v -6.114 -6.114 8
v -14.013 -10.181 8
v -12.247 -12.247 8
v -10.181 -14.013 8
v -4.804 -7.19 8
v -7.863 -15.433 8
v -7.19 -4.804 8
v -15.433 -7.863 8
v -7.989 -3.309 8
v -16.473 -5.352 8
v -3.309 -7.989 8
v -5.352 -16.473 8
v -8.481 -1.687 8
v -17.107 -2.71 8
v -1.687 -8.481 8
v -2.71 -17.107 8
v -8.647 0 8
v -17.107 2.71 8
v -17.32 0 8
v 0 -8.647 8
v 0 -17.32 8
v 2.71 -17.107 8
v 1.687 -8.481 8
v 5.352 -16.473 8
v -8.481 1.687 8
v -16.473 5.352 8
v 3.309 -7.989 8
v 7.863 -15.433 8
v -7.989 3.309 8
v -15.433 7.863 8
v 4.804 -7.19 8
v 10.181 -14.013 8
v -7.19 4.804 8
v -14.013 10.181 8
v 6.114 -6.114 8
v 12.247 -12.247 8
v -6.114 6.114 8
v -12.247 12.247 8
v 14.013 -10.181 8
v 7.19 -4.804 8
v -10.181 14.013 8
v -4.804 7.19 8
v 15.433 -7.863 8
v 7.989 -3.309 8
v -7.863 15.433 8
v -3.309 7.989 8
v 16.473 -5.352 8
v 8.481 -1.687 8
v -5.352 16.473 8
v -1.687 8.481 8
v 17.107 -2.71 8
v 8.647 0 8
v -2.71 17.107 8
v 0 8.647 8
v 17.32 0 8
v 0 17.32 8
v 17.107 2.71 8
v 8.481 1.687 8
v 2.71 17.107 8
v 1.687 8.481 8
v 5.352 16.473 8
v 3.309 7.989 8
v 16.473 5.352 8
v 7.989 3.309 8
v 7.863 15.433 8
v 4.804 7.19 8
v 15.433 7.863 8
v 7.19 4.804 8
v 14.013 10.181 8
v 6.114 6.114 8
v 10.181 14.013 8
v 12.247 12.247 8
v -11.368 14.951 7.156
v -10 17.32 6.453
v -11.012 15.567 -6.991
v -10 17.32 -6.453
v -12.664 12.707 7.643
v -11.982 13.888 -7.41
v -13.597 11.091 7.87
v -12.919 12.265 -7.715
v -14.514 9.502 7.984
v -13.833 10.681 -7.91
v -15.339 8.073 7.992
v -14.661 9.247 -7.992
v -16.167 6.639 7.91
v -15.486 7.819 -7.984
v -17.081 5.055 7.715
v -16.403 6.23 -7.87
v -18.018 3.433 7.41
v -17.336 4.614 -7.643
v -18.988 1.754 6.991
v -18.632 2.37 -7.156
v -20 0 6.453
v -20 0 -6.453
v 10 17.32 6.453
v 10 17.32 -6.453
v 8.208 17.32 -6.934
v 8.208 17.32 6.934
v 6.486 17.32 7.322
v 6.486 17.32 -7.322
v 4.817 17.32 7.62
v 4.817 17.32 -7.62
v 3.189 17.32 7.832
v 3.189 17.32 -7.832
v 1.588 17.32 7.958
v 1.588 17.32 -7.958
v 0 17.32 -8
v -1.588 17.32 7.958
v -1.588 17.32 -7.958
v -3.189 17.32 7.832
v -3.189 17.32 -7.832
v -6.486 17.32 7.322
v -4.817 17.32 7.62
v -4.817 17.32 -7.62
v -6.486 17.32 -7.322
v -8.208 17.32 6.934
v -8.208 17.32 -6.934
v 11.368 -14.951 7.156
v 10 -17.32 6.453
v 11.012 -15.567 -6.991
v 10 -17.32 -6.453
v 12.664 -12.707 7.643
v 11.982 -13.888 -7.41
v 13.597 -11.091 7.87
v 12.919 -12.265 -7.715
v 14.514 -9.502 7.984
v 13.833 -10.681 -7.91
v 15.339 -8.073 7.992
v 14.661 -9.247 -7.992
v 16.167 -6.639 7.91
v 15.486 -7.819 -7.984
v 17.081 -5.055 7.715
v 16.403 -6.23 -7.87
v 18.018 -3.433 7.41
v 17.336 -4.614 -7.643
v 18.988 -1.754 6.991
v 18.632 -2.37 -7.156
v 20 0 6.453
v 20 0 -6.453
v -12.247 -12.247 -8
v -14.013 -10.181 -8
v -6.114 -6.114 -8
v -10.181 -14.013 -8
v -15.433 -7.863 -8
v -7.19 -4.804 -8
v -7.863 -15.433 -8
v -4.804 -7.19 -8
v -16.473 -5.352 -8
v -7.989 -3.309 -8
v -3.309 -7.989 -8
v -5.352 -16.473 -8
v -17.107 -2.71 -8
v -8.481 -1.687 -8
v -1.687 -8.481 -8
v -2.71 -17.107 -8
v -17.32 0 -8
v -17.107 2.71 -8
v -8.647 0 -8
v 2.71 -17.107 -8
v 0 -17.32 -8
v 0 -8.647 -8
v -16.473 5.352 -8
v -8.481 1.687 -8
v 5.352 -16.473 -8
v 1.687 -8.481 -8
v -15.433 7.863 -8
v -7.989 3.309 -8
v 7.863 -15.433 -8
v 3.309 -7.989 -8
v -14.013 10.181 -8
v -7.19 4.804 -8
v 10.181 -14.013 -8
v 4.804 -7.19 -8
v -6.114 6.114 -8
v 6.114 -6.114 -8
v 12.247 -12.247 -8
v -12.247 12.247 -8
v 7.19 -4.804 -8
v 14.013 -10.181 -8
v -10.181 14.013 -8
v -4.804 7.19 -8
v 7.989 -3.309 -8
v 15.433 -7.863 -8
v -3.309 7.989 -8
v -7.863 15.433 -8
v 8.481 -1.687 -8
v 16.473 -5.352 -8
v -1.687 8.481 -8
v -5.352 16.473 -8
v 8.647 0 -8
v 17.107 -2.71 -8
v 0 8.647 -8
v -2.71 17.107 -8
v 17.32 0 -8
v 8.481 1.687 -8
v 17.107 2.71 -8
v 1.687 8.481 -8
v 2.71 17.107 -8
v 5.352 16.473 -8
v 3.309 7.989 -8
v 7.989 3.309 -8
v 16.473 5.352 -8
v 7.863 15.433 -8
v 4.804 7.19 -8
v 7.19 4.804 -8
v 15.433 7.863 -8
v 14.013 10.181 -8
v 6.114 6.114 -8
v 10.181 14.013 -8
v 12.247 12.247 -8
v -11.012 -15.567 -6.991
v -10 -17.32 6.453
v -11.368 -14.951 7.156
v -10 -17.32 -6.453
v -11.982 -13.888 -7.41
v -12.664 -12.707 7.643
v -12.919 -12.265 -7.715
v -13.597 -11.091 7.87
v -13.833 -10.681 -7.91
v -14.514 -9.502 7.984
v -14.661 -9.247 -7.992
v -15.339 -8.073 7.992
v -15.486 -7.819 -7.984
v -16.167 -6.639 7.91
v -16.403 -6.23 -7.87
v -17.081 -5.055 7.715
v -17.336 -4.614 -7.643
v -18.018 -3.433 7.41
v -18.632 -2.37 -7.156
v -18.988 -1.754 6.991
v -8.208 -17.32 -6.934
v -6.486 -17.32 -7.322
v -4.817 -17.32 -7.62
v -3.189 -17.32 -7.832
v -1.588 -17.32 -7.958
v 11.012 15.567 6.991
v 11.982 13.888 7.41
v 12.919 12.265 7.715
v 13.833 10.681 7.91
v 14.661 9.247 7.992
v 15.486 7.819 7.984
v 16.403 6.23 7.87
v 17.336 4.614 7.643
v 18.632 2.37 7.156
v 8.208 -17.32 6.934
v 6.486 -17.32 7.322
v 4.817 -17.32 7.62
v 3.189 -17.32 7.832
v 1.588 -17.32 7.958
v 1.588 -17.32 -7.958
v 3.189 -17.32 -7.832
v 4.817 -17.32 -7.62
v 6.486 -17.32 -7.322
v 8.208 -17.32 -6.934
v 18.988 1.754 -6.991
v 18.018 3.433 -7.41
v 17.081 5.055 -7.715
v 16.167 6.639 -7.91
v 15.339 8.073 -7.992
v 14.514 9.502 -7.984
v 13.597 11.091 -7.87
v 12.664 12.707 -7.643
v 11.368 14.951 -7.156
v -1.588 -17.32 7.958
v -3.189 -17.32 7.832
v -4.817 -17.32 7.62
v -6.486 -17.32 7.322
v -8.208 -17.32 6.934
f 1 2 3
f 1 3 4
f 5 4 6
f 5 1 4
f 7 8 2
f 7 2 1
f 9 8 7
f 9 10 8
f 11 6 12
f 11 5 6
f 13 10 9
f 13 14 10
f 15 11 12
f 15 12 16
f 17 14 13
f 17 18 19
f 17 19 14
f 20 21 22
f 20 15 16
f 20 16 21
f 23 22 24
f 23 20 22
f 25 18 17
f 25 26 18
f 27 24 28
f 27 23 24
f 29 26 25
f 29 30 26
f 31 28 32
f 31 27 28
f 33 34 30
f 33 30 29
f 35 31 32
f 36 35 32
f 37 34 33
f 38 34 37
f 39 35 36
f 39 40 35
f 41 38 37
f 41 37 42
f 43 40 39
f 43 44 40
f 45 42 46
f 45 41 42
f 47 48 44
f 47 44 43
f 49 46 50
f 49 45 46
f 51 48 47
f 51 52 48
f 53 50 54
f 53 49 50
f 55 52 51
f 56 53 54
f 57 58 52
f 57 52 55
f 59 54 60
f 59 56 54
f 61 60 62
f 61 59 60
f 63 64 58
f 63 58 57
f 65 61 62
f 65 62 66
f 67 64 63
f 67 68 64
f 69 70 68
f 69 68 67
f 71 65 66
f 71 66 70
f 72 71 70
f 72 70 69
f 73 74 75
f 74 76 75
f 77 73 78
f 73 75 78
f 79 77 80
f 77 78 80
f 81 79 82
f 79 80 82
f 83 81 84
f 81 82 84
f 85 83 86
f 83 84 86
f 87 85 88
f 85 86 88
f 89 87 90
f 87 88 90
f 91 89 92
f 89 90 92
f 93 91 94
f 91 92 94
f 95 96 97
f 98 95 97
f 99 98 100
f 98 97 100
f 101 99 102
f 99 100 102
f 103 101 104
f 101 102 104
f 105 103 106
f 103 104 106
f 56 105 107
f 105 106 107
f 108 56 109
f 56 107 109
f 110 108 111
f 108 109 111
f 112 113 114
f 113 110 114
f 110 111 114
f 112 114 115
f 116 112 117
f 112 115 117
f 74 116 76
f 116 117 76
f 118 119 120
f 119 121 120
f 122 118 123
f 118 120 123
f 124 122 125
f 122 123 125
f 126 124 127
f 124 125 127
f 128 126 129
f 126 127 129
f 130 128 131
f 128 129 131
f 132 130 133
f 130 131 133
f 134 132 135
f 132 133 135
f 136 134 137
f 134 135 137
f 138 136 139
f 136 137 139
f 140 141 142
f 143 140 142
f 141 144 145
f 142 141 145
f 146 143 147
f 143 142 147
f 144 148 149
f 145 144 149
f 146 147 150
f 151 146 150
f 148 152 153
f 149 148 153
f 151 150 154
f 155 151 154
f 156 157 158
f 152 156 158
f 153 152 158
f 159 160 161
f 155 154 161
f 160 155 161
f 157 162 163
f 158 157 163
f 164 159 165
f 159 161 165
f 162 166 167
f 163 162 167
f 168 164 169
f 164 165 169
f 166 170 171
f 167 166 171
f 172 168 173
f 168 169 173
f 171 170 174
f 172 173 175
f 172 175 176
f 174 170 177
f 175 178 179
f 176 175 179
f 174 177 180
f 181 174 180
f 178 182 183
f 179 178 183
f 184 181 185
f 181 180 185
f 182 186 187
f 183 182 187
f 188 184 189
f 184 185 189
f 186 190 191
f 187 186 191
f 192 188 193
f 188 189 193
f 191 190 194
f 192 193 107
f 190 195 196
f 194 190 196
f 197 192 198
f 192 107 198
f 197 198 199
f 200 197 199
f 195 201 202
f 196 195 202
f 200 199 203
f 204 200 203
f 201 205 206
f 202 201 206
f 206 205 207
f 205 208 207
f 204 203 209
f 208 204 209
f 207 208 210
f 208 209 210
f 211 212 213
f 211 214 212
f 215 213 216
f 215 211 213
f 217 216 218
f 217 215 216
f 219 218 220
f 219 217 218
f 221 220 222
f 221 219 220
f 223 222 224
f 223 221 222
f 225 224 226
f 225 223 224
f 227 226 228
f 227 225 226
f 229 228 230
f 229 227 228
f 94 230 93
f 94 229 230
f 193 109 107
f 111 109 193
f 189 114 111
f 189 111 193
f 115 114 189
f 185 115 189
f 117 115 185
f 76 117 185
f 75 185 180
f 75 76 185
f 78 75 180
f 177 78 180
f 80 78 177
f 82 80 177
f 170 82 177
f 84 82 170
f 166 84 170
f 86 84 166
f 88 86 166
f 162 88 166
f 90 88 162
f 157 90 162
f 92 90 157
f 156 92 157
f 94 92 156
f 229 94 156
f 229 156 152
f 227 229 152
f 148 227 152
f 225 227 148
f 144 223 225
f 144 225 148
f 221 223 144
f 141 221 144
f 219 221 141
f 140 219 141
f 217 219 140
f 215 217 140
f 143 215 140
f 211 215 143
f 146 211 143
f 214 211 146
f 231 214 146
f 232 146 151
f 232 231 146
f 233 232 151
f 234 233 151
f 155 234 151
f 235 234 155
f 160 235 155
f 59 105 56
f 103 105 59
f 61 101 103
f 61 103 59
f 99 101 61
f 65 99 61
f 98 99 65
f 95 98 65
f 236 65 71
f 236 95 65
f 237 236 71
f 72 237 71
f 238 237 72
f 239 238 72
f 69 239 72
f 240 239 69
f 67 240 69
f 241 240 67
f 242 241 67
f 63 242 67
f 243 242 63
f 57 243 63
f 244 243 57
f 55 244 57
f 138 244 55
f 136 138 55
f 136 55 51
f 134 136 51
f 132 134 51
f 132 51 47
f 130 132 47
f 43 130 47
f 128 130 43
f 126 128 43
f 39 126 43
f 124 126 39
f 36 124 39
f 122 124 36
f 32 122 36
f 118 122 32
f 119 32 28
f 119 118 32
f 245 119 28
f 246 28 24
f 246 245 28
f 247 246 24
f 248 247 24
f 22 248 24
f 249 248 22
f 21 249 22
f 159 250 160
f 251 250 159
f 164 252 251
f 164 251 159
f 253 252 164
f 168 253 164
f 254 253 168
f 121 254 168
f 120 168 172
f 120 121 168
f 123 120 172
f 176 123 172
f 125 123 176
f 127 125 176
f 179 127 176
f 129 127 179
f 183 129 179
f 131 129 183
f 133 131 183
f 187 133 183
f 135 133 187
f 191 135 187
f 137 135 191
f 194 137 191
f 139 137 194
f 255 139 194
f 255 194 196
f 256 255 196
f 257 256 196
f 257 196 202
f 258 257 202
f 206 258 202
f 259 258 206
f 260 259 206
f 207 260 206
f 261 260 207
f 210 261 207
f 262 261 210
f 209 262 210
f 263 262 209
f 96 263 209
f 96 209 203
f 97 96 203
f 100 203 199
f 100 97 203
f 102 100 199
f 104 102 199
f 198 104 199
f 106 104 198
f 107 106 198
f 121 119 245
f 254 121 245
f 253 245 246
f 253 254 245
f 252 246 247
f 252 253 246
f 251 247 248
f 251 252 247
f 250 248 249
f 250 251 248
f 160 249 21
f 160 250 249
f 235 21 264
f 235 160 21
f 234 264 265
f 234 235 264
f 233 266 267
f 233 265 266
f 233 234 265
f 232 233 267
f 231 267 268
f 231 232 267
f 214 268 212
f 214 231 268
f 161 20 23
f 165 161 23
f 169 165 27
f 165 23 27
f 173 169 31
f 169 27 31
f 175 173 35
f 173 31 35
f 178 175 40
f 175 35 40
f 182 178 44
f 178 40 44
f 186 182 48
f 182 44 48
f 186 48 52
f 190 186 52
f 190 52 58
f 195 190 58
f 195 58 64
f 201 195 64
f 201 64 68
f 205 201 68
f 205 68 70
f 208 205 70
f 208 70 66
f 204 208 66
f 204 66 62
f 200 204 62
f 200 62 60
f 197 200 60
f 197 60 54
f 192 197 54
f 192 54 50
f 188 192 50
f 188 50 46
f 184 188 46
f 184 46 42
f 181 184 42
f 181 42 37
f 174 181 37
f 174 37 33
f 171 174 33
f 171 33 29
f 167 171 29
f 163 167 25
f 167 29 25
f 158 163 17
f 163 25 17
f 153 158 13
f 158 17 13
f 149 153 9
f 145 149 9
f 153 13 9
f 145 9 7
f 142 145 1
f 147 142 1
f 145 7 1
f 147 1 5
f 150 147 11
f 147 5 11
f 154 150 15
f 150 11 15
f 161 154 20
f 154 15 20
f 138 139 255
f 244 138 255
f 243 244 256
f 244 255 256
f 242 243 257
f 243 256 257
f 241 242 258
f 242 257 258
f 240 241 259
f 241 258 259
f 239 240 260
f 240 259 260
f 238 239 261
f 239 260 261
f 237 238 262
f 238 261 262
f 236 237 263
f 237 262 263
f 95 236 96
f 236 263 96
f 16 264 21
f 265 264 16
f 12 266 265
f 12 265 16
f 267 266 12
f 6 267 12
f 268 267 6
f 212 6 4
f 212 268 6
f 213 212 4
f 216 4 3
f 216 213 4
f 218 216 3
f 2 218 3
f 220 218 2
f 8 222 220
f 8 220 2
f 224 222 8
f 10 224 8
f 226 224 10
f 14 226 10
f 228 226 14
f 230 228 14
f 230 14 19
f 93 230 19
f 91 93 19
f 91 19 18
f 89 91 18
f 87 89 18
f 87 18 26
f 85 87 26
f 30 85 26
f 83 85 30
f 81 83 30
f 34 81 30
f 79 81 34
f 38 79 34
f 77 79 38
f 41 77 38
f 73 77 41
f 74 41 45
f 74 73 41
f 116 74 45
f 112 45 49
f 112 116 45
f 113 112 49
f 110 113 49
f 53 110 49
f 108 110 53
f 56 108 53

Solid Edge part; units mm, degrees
sketch "Sketch1" plane through (0, 0, 0) normal (0, 0, 1) x (1, 0, 0)
  line L0 (10, -17.3205) -> (20, 0)
  line L1 (20, 0) -> (10, 17.3205)
  line L2 (10, 17.3205) -> (-10, 17.3205)
  line L3 (-10, 17.3205) -> (-20, 0)
  line L4 (-10, -17.3205) -> (-20, 0)
  line L5 (10, -17.3205) -> (-10, -17.3205)
extrude "Protrusion1" add sketch "Sketch1" along normal mid plane 16
hole "Hole_1" at (0, 0, 8) direction (0, 0, -1) diameter 17.294 end through all
sketch "Sketch2" plane through (0, 0, 0) normal (1, 0, 0) x (0, 1, 0)
  line L0 (17.3205, -8) -> (33.7074, 1.461)
revolve "RevolvedCutout1" cut sketch "Sketch2" angle 360 about axis through (0, 0, -57) along (0, 0, 1) material side at (0, 25.539, -3.3128)
mirror "Mirror1" about plane through (0, 0, 0) normal (0, 0, 1) of "RevolvedCutout1"
properties part number "6" material "Fe 410 W"
